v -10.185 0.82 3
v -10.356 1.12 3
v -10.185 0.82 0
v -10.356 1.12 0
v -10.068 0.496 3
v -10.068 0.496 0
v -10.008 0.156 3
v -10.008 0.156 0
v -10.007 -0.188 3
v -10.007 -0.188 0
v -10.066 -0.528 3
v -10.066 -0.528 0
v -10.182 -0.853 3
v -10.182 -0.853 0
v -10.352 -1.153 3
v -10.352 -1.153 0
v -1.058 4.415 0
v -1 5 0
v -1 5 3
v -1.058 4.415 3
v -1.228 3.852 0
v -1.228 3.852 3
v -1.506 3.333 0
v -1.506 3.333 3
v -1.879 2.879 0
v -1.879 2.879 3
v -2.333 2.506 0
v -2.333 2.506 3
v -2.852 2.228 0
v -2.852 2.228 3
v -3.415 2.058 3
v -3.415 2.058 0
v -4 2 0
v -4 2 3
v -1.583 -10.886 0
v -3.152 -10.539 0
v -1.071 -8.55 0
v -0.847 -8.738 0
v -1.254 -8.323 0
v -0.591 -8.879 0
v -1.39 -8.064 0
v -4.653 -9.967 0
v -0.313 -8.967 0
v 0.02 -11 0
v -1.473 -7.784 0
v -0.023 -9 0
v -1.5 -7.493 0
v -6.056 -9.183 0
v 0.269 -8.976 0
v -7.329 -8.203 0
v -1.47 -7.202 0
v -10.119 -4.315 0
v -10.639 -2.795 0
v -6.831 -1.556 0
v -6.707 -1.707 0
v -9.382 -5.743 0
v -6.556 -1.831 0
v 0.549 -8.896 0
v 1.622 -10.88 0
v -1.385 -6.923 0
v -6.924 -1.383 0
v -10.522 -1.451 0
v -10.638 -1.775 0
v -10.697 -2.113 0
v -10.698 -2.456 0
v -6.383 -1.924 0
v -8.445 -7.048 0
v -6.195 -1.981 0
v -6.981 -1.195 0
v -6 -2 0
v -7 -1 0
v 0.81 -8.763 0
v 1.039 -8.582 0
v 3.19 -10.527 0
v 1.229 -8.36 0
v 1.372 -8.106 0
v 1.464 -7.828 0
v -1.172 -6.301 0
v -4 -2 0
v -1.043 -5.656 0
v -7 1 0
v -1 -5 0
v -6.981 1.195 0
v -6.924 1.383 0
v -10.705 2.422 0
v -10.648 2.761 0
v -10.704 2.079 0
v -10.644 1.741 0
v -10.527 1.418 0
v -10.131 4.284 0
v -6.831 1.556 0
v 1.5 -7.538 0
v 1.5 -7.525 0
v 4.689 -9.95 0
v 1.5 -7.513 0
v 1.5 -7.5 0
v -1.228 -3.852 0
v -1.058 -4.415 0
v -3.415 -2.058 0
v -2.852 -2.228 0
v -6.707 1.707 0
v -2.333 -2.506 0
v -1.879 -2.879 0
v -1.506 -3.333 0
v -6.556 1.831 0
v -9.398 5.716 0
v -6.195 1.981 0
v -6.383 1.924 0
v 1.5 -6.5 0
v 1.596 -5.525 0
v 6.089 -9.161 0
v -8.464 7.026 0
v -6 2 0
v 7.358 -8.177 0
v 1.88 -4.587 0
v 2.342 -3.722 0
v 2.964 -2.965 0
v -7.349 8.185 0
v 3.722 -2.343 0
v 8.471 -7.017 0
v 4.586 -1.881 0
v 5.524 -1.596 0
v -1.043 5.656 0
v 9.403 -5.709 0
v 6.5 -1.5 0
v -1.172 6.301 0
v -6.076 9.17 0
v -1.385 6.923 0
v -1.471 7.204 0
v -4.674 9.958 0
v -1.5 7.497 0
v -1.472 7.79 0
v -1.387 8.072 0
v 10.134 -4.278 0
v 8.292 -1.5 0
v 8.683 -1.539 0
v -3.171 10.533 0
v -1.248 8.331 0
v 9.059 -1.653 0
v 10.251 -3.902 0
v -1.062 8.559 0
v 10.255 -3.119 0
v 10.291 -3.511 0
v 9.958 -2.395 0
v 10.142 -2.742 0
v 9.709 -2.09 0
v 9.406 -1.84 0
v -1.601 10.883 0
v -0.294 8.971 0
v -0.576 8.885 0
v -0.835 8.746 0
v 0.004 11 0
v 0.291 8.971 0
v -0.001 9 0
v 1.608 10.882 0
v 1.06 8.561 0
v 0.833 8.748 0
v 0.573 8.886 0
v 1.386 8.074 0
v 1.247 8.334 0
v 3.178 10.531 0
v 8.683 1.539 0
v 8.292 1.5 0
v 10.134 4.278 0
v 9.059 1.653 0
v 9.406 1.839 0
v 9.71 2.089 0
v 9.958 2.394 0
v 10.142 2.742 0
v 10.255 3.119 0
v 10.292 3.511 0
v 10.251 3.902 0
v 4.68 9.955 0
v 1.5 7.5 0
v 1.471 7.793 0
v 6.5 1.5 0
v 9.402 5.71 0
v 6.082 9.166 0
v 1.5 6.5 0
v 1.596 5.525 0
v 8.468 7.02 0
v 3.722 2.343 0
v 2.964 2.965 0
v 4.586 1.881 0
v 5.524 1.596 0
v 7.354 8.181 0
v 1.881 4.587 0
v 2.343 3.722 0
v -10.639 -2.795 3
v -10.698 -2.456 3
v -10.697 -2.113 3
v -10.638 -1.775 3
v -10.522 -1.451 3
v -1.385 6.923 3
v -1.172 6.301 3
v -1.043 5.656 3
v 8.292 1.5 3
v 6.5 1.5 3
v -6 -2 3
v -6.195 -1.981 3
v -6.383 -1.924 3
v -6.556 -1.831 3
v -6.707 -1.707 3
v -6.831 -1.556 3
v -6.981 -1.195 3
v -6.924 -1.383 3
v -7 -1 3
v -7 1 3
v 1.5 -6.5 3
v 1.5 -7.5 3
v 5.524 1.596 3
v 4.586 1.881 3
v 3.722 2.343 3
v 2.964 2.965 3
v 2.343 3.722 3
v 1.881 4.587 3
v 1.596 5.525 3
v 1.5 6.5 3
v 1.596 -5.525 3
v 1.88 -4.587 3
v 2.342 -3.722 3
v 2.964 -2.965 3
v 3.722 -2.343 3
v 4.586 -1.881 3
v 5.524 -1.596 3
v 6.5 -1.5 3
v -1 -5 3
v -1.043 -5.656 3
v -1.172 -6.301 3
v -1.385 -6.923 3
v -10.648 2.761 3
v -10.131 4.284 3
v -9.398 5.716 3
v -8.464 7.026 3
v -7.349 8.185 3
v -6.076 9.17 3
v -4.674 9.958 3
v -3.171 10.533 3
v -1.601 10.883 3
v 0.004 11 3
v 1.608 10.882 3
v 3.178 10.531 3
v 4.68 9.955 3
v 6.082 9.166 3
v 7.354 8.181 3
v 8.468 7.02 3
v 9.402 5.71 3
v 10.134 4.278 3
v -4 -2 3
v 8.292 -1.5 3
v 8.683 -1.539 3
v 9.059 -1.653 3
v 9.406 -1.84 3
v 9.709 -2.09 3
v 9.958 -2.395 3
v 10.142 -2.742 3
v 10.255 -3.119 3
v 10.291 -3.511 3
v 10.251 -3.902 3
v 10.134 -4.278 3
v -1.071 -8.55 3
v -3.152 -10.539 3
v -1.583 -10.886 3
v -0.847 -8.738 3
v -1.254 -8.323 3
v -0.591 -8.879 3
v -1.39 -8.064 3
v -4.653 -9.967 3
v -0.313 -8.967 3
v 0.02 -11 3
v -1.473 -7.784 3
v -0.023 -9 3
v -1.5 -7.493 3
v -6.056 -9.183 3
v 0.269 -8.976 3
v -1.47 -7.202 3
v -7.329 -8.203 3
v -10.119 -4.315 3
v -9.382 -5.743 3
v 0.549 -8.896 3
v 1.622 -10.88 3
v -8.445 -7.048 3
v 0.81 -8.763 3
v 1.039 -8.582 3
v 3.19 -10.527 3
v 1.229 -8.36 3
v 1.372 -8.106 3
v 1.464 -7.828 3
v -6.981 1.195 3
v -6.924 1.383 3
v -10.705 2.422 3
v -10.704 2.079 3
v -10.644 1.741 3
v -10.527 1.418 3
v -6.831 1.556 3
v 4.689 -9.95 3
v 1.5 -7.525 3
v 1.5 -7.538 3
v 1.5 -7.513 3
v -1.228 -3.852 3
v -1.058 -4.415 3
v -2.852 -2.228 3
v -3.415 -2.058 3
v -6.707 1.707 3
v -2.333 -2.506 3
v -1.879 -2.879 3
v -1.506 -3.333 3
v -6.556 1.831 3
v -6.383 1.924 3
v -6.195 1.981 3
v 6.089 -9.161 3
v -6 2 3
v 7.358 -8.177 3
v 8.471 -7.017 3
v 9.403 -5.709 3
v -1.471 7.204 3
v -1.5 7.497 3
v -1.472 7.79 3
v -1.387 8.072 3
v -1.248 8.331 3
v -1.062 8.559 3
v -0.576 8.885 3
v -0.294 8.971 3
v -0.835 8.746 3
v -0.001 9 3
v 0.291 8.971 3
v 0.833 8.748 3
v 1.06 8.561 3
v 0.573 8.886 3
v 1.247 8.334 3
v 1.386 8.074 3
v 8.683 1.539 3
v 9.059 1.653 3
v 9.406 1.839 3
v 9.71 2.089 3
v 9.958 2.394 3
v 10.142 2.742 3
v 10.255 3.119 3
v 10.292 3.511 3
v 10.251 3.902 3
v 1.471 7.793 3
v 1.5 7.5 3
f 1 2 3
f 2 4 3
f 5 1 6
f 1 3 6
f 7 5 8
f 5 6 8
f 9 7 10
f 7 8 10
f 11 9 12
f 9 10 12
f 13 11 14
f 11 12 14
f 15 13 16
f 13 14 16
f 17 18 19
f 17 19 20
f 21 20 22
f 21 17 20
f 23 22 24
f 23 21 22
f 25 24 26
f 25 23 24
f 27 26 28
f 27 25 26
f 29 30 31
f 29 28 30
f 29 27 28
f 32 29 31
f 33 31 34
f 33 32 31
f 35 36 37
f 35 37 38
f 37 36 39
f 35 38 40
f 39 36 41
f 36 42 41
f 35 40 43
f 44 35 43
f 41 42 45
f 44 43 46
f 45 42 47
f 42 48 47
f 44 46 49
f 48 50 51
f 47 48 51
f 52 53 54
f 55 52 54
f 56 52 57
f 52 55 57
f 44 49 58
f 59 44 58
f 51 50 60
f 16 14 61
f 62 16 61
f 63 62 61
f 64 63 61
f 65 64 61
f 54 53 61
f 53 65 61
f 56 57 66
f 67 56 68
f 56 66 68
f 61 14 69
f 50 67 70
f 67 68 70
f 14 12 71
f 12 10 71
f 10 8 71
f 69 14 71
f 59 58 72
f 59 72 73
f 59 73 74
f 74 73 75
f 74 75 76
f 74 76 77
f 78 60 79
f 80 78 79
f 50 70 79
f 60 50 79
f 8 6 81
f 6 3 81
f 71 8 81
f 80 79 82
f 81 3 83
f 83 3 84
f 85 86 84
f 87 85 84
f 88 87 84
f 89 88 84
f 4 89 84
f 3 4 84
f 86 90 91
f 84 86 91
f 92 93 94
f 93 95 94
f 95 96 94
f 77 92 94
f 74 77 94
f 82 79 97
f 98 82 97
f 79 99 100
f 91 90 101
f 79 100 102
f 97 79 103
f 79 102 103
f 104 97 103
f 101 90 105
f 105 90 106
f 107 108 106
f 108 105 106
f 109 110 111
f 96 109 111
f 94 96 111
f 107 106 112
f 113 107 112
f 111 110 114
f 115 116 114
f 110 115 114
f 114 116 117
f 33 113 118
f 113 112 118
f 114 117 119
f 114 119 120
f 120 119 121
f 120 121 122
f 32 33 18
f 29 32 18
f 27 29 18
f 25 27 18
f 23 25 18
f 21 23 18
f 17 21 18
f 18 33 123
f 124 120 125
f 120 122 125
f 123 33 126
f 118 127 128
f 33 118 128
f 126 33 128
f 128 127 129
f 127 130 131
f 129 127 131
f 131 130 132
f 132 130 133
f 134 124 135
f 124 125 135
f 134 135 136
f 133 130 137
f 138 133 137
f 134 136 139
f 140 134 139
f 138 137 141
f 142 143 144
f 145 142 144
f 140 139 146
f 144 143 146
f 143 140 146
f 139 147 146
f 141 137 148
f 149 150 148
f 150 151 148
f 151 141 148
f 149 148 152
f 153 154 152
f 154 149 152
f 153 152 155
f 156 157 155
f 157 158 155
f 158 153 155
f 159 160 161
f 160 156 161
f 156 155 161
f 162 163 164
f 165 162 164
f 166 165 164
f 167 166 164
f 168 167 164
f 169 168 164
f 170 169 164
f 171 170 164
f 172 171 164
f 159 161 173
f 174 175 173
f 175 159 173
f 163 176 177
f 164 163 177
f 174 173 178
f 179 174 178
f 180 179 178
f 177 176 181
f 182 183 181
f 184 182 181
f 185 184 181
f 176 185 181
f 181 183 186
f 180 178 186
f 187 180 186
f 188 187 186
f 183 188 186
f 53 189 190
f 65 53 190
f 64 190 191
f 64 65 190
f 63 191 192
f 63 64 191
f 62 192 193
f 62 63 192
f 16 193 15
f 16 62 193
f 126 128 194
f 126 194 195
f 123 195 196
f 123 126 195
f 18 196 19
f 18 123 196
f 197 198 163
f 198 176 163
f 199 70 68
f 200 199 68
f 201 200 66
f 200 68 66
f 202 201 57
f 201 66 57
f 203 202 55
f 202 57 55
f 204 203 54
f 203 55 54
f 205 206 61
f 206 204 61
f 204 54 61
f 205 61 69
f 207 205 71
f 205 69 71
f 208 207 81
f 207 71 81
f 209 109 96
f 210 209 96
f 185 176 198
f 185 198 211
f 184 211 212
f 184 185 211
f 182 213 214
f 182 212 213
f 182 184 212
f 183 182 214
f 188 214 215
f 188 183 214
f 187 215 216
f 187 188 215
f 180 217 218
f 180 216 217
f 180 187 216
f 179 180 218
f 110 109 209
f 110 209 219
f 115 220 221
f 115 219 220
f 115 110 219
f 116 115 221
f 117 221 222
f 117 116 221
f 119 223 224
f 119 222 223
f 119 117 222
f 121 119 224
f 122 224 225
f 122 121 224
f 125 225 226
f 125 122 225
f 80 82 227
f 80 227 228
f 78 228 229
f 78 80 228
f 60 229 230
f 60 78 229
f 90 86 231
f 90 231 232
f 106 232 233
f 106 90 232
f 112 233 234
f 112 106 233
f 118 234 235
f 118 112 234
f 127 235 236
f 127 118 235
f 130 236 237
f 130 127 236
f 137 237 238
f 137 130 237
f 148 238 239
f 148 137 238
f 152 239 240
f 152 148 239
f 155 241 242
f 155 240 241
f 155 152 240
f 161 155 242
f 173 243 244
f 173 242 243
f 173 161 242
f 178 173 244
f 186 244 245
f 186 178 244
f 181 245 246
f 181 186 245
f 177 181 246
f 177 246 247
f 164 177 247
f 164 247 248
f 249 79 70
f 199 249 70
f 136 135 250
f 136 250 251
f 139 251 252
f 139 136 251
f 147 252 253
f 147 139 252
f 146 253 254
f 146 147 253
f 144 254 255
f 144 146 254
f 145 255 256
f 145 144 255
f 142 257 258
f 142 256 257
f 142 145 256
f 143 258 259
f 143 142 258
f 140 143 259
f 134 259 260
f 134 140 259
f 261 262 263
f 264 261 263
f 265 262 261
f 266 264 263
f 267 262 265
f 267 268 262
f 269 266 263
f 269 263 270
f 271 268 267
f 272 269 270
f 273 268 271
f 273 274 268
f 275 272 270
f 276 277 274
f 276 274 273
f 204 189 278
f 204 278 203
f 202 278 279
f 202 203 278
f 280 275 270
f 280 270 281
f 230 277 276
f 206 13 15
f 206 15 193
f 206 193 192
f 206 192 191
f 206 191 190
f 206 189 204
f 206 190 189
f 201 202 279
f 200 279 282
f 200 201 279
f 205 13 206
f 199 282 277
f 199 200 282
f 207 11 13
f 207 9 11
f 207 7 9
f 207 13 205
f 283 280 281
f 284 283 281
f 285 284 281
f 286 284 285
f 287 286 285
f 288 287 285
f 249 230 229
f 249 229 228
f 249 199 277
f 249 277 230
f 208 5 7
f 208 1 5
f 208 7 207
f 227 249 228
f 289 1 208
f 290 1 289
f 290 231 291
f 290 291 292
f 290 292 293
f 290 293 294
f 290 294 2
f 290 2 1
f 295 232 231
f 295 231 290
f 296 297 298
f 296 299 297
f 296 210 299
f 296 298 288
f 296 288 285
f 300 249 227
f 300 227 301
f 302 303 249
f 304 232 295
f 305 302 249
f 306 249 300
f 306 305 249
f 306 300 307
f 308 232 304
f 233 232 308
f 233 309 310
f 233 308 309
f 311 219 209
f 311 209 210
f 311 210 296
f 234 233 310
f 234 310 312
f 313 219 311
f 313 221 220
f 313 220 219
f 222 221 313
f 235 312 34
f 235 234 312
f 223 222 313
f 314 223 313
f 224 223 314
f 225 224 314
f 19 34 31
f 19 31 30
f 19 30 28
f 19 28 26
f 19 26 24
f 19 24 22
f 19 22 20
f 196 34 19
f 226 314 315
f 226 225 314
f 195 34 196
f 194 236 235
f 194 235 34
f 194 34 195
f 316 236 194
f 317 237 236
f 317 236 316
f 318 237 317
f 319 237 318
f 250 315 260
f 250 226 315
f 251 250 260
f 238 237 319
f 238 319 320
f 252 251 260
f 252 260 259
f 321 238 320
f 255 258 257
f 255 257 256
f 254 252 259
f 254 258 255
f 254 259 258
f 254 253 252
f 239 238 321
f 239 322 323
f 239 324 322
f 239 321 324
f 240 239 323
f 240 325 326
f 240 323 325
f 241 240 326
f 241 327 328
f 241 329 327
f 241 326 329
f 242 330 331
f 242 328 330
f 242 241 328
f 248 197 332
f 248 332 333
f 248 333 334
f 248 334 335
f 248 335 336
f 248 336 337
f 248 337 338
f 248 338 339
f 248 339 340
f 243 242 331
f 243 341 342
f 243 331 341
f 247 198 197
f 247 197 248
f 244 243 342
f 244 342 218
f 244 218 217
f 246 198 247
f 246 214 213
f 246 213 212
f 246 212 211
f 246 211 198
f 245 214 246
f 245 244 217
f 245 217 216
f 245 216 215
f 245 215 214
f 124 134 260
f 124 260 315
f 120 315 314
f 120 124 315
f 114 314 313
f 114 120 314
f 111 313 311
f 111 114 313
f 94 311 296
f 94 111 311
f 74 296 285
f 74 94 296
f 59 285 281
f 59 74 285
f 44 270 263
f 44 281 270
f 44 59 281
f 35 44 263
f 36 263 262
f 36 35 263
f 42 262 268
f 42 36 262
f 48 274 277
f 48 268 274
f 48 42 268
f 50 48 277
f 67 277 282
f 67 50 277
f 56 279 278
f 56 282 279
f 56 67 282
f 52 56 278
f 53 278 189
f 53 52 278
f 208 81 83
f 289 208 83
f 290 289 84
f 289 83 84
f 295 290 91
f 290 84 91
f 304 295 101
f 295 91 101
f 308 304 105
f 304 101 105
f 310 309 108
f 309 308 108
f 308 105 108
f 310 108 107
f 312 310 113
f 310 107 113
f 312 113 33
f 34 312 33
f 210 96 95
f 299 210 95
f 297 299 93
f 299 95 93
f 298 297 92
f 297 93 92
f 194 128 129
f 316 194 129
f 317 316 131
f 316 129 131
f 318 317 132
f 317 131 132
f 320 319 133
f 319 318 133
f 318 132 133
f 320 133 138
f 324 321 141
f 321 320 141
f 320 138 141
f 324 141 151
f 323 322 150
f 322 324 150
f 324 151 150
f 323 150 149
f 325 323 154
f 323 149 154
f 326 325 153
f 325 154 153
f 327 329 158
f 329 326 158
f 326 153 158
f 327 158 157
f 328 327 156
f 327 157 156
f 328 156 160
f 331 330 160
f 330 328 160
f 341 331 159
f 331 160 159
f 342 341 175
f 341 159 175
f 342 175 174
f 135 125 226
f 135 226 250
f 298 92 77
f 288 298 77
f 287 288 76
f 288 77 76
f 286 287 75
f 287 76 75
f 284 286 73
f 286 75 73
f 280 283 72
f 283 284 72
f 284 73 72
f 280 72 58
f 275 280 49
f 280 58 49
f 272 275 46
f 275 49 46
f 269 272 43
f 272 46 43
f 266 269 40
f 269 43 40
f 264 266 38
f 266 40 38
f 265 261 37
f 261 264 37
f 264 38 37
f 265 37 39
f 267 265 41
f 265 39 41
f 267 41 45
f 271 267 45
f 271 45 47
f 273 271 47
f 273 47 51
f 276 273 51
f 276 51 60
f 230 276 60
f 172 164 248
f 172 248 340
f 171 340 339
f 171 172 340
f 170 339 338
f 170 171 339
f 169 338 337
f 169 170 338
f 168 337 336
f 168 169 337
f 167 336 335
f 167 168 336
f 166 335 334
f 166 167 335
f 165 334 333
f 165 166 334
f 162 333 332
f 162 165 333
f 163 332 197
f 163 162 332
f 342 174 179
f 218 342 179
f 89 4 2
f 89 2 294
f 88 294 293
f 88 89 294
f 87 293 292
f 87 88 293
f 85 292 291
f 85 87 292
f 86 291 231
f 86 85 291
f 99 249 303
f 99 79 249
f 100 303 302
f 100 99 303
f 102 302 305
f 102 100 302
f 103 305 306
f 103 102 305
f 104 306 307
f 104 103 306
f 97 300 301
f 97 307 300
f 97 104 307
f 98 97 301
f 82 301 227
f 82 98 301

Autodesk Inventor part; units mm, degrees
ref_plane "YZ Plane" through (0, 0, 0) normal (1, 0, 0) x (0, 1, 0)
ref_plane "XZ Plane" through (0, 0, 0) normal (0, 1, 0) x (-1, 0, 0)
ref_plane "XY Plane" through (0, 0, 0) normal (0, 0, 1) x (1, 0, 0)
sketch "Sketch1" plane through (0, 0, 0) normal (0, 0, 1) x (1, 0, 0)
  arc A0 (1.5, 7.5) -> (-1.3846, 6.9231) centre (0, 7.5) ccw
  arc A1 (-1.3846, -6.9231) -> (1.5, -7.5) centre (0, -7.5) ccw
  arc A2 (-10.3524, -1.1528) -> (-10.356, 1.1198) centre (-12, -0.0191) ccw
  arc A3 (10.1342, 4.2777) -> (-10.6479, 2.7607) centre (0, 0) ccw
  arc A4 (-10.6391, -2.7946) -> (10.134, -4.278) centre (0, 0) ccw
  arc A5 (-10.6479, 2.7607) -> (-10.356, 1.1198) centre (-8.7119, 2.2588) ccw
  arc A6 (-10.3524, -1.1528) -> (-10.6391, -2.7946) centre (-8.7047, -2.2865) ccw
  arc A7 (-1, 5) -> (-1.3846, 6.9231) centre (-6, 5) ccw
  arc A8 (-1.3846, -6.9231) -> (-1, -5) centre (-6, -5) ccw
  line L0 (1.5, 7.5) -> (1.5, 6.5)
  line L1 (1.4995, -6.5) -> (1.4995, -7.5382)
  line L2 (6.4997, -1.5002) -> (8.2915, -1.5002)
  line L3 (6.4998, 1.5) -> (8.2915, 1.4999)
  arc A9 (6.4997, -1.5002) -> (1.4995, -6.5) centre (6.4995, -6.5002) ccw
  arc A10 (1.5, 6.5) -> (6.4998, 1.5) centre (6.5, 6.5) ccw
  arc A11 (10.134, -4.278) -> (8.2915, -1.5002) centre (8.2915, -3.5002) ccw
  arc A12 (8.2915, 1.4999) -> (10.1342, 4.2777) centre (8.2916, 3.4999) ccw
  line L4 (-6, 2) -> (-4, 2)
  line L5 (-4, -2) -> (-6, -2)
  line L6 (-7, -1) -> (-7, 1)
  arc A13 (-6, 2) -> (-7, 1) centre (-6, 1) ccw
  arc A14 (-7, -1) -> (-6, -2) centre (-6, -1) ccw
  line L7 (-1, -5) -> (-1, -5)
  line L8 (-1, 5) -> (-1, 5)
  arc A15 (-4, 2) -> (-1, 5) centre (-4, 5) ccw
  arc A16 (-1, -5) -> (-4, -2) centre (-4, -5) ccw
  point P0 (10.8972, -1.5003)
  point P1 (10.8973, 1.4999)
  point P2 (1.5, 1.5002)
  point P3 (1.4997, -1.5)
  point P4 (-1, -6.382)
  point P5 (-1, 6.382)
  point P6 (-7, 2)
  point P7 (-7, -2)
  point P8 (-4.7429, 0)
  dimension "d5" = 3
  dimension "d6" = 3
  dimension "d7" = 15
  dimension "d18" = 7.5
  dimension "d20" = 4
  dimension "d21" = 12
  dimension "d22" = 2
  dimension "d26" = 5
  dimension "d27" = 5
  dimension "d28" = 2
  dimension "d30" = 4
  dimension "d31" = 1
  dimension "d32" = 3
  dimension "d33" = 7
extrude "Extrusion2" add sketch "Sketch1" along normal blind 3
properties part number "020914 Aft Middle Endcap" material "Polycarbonate, Clear"
